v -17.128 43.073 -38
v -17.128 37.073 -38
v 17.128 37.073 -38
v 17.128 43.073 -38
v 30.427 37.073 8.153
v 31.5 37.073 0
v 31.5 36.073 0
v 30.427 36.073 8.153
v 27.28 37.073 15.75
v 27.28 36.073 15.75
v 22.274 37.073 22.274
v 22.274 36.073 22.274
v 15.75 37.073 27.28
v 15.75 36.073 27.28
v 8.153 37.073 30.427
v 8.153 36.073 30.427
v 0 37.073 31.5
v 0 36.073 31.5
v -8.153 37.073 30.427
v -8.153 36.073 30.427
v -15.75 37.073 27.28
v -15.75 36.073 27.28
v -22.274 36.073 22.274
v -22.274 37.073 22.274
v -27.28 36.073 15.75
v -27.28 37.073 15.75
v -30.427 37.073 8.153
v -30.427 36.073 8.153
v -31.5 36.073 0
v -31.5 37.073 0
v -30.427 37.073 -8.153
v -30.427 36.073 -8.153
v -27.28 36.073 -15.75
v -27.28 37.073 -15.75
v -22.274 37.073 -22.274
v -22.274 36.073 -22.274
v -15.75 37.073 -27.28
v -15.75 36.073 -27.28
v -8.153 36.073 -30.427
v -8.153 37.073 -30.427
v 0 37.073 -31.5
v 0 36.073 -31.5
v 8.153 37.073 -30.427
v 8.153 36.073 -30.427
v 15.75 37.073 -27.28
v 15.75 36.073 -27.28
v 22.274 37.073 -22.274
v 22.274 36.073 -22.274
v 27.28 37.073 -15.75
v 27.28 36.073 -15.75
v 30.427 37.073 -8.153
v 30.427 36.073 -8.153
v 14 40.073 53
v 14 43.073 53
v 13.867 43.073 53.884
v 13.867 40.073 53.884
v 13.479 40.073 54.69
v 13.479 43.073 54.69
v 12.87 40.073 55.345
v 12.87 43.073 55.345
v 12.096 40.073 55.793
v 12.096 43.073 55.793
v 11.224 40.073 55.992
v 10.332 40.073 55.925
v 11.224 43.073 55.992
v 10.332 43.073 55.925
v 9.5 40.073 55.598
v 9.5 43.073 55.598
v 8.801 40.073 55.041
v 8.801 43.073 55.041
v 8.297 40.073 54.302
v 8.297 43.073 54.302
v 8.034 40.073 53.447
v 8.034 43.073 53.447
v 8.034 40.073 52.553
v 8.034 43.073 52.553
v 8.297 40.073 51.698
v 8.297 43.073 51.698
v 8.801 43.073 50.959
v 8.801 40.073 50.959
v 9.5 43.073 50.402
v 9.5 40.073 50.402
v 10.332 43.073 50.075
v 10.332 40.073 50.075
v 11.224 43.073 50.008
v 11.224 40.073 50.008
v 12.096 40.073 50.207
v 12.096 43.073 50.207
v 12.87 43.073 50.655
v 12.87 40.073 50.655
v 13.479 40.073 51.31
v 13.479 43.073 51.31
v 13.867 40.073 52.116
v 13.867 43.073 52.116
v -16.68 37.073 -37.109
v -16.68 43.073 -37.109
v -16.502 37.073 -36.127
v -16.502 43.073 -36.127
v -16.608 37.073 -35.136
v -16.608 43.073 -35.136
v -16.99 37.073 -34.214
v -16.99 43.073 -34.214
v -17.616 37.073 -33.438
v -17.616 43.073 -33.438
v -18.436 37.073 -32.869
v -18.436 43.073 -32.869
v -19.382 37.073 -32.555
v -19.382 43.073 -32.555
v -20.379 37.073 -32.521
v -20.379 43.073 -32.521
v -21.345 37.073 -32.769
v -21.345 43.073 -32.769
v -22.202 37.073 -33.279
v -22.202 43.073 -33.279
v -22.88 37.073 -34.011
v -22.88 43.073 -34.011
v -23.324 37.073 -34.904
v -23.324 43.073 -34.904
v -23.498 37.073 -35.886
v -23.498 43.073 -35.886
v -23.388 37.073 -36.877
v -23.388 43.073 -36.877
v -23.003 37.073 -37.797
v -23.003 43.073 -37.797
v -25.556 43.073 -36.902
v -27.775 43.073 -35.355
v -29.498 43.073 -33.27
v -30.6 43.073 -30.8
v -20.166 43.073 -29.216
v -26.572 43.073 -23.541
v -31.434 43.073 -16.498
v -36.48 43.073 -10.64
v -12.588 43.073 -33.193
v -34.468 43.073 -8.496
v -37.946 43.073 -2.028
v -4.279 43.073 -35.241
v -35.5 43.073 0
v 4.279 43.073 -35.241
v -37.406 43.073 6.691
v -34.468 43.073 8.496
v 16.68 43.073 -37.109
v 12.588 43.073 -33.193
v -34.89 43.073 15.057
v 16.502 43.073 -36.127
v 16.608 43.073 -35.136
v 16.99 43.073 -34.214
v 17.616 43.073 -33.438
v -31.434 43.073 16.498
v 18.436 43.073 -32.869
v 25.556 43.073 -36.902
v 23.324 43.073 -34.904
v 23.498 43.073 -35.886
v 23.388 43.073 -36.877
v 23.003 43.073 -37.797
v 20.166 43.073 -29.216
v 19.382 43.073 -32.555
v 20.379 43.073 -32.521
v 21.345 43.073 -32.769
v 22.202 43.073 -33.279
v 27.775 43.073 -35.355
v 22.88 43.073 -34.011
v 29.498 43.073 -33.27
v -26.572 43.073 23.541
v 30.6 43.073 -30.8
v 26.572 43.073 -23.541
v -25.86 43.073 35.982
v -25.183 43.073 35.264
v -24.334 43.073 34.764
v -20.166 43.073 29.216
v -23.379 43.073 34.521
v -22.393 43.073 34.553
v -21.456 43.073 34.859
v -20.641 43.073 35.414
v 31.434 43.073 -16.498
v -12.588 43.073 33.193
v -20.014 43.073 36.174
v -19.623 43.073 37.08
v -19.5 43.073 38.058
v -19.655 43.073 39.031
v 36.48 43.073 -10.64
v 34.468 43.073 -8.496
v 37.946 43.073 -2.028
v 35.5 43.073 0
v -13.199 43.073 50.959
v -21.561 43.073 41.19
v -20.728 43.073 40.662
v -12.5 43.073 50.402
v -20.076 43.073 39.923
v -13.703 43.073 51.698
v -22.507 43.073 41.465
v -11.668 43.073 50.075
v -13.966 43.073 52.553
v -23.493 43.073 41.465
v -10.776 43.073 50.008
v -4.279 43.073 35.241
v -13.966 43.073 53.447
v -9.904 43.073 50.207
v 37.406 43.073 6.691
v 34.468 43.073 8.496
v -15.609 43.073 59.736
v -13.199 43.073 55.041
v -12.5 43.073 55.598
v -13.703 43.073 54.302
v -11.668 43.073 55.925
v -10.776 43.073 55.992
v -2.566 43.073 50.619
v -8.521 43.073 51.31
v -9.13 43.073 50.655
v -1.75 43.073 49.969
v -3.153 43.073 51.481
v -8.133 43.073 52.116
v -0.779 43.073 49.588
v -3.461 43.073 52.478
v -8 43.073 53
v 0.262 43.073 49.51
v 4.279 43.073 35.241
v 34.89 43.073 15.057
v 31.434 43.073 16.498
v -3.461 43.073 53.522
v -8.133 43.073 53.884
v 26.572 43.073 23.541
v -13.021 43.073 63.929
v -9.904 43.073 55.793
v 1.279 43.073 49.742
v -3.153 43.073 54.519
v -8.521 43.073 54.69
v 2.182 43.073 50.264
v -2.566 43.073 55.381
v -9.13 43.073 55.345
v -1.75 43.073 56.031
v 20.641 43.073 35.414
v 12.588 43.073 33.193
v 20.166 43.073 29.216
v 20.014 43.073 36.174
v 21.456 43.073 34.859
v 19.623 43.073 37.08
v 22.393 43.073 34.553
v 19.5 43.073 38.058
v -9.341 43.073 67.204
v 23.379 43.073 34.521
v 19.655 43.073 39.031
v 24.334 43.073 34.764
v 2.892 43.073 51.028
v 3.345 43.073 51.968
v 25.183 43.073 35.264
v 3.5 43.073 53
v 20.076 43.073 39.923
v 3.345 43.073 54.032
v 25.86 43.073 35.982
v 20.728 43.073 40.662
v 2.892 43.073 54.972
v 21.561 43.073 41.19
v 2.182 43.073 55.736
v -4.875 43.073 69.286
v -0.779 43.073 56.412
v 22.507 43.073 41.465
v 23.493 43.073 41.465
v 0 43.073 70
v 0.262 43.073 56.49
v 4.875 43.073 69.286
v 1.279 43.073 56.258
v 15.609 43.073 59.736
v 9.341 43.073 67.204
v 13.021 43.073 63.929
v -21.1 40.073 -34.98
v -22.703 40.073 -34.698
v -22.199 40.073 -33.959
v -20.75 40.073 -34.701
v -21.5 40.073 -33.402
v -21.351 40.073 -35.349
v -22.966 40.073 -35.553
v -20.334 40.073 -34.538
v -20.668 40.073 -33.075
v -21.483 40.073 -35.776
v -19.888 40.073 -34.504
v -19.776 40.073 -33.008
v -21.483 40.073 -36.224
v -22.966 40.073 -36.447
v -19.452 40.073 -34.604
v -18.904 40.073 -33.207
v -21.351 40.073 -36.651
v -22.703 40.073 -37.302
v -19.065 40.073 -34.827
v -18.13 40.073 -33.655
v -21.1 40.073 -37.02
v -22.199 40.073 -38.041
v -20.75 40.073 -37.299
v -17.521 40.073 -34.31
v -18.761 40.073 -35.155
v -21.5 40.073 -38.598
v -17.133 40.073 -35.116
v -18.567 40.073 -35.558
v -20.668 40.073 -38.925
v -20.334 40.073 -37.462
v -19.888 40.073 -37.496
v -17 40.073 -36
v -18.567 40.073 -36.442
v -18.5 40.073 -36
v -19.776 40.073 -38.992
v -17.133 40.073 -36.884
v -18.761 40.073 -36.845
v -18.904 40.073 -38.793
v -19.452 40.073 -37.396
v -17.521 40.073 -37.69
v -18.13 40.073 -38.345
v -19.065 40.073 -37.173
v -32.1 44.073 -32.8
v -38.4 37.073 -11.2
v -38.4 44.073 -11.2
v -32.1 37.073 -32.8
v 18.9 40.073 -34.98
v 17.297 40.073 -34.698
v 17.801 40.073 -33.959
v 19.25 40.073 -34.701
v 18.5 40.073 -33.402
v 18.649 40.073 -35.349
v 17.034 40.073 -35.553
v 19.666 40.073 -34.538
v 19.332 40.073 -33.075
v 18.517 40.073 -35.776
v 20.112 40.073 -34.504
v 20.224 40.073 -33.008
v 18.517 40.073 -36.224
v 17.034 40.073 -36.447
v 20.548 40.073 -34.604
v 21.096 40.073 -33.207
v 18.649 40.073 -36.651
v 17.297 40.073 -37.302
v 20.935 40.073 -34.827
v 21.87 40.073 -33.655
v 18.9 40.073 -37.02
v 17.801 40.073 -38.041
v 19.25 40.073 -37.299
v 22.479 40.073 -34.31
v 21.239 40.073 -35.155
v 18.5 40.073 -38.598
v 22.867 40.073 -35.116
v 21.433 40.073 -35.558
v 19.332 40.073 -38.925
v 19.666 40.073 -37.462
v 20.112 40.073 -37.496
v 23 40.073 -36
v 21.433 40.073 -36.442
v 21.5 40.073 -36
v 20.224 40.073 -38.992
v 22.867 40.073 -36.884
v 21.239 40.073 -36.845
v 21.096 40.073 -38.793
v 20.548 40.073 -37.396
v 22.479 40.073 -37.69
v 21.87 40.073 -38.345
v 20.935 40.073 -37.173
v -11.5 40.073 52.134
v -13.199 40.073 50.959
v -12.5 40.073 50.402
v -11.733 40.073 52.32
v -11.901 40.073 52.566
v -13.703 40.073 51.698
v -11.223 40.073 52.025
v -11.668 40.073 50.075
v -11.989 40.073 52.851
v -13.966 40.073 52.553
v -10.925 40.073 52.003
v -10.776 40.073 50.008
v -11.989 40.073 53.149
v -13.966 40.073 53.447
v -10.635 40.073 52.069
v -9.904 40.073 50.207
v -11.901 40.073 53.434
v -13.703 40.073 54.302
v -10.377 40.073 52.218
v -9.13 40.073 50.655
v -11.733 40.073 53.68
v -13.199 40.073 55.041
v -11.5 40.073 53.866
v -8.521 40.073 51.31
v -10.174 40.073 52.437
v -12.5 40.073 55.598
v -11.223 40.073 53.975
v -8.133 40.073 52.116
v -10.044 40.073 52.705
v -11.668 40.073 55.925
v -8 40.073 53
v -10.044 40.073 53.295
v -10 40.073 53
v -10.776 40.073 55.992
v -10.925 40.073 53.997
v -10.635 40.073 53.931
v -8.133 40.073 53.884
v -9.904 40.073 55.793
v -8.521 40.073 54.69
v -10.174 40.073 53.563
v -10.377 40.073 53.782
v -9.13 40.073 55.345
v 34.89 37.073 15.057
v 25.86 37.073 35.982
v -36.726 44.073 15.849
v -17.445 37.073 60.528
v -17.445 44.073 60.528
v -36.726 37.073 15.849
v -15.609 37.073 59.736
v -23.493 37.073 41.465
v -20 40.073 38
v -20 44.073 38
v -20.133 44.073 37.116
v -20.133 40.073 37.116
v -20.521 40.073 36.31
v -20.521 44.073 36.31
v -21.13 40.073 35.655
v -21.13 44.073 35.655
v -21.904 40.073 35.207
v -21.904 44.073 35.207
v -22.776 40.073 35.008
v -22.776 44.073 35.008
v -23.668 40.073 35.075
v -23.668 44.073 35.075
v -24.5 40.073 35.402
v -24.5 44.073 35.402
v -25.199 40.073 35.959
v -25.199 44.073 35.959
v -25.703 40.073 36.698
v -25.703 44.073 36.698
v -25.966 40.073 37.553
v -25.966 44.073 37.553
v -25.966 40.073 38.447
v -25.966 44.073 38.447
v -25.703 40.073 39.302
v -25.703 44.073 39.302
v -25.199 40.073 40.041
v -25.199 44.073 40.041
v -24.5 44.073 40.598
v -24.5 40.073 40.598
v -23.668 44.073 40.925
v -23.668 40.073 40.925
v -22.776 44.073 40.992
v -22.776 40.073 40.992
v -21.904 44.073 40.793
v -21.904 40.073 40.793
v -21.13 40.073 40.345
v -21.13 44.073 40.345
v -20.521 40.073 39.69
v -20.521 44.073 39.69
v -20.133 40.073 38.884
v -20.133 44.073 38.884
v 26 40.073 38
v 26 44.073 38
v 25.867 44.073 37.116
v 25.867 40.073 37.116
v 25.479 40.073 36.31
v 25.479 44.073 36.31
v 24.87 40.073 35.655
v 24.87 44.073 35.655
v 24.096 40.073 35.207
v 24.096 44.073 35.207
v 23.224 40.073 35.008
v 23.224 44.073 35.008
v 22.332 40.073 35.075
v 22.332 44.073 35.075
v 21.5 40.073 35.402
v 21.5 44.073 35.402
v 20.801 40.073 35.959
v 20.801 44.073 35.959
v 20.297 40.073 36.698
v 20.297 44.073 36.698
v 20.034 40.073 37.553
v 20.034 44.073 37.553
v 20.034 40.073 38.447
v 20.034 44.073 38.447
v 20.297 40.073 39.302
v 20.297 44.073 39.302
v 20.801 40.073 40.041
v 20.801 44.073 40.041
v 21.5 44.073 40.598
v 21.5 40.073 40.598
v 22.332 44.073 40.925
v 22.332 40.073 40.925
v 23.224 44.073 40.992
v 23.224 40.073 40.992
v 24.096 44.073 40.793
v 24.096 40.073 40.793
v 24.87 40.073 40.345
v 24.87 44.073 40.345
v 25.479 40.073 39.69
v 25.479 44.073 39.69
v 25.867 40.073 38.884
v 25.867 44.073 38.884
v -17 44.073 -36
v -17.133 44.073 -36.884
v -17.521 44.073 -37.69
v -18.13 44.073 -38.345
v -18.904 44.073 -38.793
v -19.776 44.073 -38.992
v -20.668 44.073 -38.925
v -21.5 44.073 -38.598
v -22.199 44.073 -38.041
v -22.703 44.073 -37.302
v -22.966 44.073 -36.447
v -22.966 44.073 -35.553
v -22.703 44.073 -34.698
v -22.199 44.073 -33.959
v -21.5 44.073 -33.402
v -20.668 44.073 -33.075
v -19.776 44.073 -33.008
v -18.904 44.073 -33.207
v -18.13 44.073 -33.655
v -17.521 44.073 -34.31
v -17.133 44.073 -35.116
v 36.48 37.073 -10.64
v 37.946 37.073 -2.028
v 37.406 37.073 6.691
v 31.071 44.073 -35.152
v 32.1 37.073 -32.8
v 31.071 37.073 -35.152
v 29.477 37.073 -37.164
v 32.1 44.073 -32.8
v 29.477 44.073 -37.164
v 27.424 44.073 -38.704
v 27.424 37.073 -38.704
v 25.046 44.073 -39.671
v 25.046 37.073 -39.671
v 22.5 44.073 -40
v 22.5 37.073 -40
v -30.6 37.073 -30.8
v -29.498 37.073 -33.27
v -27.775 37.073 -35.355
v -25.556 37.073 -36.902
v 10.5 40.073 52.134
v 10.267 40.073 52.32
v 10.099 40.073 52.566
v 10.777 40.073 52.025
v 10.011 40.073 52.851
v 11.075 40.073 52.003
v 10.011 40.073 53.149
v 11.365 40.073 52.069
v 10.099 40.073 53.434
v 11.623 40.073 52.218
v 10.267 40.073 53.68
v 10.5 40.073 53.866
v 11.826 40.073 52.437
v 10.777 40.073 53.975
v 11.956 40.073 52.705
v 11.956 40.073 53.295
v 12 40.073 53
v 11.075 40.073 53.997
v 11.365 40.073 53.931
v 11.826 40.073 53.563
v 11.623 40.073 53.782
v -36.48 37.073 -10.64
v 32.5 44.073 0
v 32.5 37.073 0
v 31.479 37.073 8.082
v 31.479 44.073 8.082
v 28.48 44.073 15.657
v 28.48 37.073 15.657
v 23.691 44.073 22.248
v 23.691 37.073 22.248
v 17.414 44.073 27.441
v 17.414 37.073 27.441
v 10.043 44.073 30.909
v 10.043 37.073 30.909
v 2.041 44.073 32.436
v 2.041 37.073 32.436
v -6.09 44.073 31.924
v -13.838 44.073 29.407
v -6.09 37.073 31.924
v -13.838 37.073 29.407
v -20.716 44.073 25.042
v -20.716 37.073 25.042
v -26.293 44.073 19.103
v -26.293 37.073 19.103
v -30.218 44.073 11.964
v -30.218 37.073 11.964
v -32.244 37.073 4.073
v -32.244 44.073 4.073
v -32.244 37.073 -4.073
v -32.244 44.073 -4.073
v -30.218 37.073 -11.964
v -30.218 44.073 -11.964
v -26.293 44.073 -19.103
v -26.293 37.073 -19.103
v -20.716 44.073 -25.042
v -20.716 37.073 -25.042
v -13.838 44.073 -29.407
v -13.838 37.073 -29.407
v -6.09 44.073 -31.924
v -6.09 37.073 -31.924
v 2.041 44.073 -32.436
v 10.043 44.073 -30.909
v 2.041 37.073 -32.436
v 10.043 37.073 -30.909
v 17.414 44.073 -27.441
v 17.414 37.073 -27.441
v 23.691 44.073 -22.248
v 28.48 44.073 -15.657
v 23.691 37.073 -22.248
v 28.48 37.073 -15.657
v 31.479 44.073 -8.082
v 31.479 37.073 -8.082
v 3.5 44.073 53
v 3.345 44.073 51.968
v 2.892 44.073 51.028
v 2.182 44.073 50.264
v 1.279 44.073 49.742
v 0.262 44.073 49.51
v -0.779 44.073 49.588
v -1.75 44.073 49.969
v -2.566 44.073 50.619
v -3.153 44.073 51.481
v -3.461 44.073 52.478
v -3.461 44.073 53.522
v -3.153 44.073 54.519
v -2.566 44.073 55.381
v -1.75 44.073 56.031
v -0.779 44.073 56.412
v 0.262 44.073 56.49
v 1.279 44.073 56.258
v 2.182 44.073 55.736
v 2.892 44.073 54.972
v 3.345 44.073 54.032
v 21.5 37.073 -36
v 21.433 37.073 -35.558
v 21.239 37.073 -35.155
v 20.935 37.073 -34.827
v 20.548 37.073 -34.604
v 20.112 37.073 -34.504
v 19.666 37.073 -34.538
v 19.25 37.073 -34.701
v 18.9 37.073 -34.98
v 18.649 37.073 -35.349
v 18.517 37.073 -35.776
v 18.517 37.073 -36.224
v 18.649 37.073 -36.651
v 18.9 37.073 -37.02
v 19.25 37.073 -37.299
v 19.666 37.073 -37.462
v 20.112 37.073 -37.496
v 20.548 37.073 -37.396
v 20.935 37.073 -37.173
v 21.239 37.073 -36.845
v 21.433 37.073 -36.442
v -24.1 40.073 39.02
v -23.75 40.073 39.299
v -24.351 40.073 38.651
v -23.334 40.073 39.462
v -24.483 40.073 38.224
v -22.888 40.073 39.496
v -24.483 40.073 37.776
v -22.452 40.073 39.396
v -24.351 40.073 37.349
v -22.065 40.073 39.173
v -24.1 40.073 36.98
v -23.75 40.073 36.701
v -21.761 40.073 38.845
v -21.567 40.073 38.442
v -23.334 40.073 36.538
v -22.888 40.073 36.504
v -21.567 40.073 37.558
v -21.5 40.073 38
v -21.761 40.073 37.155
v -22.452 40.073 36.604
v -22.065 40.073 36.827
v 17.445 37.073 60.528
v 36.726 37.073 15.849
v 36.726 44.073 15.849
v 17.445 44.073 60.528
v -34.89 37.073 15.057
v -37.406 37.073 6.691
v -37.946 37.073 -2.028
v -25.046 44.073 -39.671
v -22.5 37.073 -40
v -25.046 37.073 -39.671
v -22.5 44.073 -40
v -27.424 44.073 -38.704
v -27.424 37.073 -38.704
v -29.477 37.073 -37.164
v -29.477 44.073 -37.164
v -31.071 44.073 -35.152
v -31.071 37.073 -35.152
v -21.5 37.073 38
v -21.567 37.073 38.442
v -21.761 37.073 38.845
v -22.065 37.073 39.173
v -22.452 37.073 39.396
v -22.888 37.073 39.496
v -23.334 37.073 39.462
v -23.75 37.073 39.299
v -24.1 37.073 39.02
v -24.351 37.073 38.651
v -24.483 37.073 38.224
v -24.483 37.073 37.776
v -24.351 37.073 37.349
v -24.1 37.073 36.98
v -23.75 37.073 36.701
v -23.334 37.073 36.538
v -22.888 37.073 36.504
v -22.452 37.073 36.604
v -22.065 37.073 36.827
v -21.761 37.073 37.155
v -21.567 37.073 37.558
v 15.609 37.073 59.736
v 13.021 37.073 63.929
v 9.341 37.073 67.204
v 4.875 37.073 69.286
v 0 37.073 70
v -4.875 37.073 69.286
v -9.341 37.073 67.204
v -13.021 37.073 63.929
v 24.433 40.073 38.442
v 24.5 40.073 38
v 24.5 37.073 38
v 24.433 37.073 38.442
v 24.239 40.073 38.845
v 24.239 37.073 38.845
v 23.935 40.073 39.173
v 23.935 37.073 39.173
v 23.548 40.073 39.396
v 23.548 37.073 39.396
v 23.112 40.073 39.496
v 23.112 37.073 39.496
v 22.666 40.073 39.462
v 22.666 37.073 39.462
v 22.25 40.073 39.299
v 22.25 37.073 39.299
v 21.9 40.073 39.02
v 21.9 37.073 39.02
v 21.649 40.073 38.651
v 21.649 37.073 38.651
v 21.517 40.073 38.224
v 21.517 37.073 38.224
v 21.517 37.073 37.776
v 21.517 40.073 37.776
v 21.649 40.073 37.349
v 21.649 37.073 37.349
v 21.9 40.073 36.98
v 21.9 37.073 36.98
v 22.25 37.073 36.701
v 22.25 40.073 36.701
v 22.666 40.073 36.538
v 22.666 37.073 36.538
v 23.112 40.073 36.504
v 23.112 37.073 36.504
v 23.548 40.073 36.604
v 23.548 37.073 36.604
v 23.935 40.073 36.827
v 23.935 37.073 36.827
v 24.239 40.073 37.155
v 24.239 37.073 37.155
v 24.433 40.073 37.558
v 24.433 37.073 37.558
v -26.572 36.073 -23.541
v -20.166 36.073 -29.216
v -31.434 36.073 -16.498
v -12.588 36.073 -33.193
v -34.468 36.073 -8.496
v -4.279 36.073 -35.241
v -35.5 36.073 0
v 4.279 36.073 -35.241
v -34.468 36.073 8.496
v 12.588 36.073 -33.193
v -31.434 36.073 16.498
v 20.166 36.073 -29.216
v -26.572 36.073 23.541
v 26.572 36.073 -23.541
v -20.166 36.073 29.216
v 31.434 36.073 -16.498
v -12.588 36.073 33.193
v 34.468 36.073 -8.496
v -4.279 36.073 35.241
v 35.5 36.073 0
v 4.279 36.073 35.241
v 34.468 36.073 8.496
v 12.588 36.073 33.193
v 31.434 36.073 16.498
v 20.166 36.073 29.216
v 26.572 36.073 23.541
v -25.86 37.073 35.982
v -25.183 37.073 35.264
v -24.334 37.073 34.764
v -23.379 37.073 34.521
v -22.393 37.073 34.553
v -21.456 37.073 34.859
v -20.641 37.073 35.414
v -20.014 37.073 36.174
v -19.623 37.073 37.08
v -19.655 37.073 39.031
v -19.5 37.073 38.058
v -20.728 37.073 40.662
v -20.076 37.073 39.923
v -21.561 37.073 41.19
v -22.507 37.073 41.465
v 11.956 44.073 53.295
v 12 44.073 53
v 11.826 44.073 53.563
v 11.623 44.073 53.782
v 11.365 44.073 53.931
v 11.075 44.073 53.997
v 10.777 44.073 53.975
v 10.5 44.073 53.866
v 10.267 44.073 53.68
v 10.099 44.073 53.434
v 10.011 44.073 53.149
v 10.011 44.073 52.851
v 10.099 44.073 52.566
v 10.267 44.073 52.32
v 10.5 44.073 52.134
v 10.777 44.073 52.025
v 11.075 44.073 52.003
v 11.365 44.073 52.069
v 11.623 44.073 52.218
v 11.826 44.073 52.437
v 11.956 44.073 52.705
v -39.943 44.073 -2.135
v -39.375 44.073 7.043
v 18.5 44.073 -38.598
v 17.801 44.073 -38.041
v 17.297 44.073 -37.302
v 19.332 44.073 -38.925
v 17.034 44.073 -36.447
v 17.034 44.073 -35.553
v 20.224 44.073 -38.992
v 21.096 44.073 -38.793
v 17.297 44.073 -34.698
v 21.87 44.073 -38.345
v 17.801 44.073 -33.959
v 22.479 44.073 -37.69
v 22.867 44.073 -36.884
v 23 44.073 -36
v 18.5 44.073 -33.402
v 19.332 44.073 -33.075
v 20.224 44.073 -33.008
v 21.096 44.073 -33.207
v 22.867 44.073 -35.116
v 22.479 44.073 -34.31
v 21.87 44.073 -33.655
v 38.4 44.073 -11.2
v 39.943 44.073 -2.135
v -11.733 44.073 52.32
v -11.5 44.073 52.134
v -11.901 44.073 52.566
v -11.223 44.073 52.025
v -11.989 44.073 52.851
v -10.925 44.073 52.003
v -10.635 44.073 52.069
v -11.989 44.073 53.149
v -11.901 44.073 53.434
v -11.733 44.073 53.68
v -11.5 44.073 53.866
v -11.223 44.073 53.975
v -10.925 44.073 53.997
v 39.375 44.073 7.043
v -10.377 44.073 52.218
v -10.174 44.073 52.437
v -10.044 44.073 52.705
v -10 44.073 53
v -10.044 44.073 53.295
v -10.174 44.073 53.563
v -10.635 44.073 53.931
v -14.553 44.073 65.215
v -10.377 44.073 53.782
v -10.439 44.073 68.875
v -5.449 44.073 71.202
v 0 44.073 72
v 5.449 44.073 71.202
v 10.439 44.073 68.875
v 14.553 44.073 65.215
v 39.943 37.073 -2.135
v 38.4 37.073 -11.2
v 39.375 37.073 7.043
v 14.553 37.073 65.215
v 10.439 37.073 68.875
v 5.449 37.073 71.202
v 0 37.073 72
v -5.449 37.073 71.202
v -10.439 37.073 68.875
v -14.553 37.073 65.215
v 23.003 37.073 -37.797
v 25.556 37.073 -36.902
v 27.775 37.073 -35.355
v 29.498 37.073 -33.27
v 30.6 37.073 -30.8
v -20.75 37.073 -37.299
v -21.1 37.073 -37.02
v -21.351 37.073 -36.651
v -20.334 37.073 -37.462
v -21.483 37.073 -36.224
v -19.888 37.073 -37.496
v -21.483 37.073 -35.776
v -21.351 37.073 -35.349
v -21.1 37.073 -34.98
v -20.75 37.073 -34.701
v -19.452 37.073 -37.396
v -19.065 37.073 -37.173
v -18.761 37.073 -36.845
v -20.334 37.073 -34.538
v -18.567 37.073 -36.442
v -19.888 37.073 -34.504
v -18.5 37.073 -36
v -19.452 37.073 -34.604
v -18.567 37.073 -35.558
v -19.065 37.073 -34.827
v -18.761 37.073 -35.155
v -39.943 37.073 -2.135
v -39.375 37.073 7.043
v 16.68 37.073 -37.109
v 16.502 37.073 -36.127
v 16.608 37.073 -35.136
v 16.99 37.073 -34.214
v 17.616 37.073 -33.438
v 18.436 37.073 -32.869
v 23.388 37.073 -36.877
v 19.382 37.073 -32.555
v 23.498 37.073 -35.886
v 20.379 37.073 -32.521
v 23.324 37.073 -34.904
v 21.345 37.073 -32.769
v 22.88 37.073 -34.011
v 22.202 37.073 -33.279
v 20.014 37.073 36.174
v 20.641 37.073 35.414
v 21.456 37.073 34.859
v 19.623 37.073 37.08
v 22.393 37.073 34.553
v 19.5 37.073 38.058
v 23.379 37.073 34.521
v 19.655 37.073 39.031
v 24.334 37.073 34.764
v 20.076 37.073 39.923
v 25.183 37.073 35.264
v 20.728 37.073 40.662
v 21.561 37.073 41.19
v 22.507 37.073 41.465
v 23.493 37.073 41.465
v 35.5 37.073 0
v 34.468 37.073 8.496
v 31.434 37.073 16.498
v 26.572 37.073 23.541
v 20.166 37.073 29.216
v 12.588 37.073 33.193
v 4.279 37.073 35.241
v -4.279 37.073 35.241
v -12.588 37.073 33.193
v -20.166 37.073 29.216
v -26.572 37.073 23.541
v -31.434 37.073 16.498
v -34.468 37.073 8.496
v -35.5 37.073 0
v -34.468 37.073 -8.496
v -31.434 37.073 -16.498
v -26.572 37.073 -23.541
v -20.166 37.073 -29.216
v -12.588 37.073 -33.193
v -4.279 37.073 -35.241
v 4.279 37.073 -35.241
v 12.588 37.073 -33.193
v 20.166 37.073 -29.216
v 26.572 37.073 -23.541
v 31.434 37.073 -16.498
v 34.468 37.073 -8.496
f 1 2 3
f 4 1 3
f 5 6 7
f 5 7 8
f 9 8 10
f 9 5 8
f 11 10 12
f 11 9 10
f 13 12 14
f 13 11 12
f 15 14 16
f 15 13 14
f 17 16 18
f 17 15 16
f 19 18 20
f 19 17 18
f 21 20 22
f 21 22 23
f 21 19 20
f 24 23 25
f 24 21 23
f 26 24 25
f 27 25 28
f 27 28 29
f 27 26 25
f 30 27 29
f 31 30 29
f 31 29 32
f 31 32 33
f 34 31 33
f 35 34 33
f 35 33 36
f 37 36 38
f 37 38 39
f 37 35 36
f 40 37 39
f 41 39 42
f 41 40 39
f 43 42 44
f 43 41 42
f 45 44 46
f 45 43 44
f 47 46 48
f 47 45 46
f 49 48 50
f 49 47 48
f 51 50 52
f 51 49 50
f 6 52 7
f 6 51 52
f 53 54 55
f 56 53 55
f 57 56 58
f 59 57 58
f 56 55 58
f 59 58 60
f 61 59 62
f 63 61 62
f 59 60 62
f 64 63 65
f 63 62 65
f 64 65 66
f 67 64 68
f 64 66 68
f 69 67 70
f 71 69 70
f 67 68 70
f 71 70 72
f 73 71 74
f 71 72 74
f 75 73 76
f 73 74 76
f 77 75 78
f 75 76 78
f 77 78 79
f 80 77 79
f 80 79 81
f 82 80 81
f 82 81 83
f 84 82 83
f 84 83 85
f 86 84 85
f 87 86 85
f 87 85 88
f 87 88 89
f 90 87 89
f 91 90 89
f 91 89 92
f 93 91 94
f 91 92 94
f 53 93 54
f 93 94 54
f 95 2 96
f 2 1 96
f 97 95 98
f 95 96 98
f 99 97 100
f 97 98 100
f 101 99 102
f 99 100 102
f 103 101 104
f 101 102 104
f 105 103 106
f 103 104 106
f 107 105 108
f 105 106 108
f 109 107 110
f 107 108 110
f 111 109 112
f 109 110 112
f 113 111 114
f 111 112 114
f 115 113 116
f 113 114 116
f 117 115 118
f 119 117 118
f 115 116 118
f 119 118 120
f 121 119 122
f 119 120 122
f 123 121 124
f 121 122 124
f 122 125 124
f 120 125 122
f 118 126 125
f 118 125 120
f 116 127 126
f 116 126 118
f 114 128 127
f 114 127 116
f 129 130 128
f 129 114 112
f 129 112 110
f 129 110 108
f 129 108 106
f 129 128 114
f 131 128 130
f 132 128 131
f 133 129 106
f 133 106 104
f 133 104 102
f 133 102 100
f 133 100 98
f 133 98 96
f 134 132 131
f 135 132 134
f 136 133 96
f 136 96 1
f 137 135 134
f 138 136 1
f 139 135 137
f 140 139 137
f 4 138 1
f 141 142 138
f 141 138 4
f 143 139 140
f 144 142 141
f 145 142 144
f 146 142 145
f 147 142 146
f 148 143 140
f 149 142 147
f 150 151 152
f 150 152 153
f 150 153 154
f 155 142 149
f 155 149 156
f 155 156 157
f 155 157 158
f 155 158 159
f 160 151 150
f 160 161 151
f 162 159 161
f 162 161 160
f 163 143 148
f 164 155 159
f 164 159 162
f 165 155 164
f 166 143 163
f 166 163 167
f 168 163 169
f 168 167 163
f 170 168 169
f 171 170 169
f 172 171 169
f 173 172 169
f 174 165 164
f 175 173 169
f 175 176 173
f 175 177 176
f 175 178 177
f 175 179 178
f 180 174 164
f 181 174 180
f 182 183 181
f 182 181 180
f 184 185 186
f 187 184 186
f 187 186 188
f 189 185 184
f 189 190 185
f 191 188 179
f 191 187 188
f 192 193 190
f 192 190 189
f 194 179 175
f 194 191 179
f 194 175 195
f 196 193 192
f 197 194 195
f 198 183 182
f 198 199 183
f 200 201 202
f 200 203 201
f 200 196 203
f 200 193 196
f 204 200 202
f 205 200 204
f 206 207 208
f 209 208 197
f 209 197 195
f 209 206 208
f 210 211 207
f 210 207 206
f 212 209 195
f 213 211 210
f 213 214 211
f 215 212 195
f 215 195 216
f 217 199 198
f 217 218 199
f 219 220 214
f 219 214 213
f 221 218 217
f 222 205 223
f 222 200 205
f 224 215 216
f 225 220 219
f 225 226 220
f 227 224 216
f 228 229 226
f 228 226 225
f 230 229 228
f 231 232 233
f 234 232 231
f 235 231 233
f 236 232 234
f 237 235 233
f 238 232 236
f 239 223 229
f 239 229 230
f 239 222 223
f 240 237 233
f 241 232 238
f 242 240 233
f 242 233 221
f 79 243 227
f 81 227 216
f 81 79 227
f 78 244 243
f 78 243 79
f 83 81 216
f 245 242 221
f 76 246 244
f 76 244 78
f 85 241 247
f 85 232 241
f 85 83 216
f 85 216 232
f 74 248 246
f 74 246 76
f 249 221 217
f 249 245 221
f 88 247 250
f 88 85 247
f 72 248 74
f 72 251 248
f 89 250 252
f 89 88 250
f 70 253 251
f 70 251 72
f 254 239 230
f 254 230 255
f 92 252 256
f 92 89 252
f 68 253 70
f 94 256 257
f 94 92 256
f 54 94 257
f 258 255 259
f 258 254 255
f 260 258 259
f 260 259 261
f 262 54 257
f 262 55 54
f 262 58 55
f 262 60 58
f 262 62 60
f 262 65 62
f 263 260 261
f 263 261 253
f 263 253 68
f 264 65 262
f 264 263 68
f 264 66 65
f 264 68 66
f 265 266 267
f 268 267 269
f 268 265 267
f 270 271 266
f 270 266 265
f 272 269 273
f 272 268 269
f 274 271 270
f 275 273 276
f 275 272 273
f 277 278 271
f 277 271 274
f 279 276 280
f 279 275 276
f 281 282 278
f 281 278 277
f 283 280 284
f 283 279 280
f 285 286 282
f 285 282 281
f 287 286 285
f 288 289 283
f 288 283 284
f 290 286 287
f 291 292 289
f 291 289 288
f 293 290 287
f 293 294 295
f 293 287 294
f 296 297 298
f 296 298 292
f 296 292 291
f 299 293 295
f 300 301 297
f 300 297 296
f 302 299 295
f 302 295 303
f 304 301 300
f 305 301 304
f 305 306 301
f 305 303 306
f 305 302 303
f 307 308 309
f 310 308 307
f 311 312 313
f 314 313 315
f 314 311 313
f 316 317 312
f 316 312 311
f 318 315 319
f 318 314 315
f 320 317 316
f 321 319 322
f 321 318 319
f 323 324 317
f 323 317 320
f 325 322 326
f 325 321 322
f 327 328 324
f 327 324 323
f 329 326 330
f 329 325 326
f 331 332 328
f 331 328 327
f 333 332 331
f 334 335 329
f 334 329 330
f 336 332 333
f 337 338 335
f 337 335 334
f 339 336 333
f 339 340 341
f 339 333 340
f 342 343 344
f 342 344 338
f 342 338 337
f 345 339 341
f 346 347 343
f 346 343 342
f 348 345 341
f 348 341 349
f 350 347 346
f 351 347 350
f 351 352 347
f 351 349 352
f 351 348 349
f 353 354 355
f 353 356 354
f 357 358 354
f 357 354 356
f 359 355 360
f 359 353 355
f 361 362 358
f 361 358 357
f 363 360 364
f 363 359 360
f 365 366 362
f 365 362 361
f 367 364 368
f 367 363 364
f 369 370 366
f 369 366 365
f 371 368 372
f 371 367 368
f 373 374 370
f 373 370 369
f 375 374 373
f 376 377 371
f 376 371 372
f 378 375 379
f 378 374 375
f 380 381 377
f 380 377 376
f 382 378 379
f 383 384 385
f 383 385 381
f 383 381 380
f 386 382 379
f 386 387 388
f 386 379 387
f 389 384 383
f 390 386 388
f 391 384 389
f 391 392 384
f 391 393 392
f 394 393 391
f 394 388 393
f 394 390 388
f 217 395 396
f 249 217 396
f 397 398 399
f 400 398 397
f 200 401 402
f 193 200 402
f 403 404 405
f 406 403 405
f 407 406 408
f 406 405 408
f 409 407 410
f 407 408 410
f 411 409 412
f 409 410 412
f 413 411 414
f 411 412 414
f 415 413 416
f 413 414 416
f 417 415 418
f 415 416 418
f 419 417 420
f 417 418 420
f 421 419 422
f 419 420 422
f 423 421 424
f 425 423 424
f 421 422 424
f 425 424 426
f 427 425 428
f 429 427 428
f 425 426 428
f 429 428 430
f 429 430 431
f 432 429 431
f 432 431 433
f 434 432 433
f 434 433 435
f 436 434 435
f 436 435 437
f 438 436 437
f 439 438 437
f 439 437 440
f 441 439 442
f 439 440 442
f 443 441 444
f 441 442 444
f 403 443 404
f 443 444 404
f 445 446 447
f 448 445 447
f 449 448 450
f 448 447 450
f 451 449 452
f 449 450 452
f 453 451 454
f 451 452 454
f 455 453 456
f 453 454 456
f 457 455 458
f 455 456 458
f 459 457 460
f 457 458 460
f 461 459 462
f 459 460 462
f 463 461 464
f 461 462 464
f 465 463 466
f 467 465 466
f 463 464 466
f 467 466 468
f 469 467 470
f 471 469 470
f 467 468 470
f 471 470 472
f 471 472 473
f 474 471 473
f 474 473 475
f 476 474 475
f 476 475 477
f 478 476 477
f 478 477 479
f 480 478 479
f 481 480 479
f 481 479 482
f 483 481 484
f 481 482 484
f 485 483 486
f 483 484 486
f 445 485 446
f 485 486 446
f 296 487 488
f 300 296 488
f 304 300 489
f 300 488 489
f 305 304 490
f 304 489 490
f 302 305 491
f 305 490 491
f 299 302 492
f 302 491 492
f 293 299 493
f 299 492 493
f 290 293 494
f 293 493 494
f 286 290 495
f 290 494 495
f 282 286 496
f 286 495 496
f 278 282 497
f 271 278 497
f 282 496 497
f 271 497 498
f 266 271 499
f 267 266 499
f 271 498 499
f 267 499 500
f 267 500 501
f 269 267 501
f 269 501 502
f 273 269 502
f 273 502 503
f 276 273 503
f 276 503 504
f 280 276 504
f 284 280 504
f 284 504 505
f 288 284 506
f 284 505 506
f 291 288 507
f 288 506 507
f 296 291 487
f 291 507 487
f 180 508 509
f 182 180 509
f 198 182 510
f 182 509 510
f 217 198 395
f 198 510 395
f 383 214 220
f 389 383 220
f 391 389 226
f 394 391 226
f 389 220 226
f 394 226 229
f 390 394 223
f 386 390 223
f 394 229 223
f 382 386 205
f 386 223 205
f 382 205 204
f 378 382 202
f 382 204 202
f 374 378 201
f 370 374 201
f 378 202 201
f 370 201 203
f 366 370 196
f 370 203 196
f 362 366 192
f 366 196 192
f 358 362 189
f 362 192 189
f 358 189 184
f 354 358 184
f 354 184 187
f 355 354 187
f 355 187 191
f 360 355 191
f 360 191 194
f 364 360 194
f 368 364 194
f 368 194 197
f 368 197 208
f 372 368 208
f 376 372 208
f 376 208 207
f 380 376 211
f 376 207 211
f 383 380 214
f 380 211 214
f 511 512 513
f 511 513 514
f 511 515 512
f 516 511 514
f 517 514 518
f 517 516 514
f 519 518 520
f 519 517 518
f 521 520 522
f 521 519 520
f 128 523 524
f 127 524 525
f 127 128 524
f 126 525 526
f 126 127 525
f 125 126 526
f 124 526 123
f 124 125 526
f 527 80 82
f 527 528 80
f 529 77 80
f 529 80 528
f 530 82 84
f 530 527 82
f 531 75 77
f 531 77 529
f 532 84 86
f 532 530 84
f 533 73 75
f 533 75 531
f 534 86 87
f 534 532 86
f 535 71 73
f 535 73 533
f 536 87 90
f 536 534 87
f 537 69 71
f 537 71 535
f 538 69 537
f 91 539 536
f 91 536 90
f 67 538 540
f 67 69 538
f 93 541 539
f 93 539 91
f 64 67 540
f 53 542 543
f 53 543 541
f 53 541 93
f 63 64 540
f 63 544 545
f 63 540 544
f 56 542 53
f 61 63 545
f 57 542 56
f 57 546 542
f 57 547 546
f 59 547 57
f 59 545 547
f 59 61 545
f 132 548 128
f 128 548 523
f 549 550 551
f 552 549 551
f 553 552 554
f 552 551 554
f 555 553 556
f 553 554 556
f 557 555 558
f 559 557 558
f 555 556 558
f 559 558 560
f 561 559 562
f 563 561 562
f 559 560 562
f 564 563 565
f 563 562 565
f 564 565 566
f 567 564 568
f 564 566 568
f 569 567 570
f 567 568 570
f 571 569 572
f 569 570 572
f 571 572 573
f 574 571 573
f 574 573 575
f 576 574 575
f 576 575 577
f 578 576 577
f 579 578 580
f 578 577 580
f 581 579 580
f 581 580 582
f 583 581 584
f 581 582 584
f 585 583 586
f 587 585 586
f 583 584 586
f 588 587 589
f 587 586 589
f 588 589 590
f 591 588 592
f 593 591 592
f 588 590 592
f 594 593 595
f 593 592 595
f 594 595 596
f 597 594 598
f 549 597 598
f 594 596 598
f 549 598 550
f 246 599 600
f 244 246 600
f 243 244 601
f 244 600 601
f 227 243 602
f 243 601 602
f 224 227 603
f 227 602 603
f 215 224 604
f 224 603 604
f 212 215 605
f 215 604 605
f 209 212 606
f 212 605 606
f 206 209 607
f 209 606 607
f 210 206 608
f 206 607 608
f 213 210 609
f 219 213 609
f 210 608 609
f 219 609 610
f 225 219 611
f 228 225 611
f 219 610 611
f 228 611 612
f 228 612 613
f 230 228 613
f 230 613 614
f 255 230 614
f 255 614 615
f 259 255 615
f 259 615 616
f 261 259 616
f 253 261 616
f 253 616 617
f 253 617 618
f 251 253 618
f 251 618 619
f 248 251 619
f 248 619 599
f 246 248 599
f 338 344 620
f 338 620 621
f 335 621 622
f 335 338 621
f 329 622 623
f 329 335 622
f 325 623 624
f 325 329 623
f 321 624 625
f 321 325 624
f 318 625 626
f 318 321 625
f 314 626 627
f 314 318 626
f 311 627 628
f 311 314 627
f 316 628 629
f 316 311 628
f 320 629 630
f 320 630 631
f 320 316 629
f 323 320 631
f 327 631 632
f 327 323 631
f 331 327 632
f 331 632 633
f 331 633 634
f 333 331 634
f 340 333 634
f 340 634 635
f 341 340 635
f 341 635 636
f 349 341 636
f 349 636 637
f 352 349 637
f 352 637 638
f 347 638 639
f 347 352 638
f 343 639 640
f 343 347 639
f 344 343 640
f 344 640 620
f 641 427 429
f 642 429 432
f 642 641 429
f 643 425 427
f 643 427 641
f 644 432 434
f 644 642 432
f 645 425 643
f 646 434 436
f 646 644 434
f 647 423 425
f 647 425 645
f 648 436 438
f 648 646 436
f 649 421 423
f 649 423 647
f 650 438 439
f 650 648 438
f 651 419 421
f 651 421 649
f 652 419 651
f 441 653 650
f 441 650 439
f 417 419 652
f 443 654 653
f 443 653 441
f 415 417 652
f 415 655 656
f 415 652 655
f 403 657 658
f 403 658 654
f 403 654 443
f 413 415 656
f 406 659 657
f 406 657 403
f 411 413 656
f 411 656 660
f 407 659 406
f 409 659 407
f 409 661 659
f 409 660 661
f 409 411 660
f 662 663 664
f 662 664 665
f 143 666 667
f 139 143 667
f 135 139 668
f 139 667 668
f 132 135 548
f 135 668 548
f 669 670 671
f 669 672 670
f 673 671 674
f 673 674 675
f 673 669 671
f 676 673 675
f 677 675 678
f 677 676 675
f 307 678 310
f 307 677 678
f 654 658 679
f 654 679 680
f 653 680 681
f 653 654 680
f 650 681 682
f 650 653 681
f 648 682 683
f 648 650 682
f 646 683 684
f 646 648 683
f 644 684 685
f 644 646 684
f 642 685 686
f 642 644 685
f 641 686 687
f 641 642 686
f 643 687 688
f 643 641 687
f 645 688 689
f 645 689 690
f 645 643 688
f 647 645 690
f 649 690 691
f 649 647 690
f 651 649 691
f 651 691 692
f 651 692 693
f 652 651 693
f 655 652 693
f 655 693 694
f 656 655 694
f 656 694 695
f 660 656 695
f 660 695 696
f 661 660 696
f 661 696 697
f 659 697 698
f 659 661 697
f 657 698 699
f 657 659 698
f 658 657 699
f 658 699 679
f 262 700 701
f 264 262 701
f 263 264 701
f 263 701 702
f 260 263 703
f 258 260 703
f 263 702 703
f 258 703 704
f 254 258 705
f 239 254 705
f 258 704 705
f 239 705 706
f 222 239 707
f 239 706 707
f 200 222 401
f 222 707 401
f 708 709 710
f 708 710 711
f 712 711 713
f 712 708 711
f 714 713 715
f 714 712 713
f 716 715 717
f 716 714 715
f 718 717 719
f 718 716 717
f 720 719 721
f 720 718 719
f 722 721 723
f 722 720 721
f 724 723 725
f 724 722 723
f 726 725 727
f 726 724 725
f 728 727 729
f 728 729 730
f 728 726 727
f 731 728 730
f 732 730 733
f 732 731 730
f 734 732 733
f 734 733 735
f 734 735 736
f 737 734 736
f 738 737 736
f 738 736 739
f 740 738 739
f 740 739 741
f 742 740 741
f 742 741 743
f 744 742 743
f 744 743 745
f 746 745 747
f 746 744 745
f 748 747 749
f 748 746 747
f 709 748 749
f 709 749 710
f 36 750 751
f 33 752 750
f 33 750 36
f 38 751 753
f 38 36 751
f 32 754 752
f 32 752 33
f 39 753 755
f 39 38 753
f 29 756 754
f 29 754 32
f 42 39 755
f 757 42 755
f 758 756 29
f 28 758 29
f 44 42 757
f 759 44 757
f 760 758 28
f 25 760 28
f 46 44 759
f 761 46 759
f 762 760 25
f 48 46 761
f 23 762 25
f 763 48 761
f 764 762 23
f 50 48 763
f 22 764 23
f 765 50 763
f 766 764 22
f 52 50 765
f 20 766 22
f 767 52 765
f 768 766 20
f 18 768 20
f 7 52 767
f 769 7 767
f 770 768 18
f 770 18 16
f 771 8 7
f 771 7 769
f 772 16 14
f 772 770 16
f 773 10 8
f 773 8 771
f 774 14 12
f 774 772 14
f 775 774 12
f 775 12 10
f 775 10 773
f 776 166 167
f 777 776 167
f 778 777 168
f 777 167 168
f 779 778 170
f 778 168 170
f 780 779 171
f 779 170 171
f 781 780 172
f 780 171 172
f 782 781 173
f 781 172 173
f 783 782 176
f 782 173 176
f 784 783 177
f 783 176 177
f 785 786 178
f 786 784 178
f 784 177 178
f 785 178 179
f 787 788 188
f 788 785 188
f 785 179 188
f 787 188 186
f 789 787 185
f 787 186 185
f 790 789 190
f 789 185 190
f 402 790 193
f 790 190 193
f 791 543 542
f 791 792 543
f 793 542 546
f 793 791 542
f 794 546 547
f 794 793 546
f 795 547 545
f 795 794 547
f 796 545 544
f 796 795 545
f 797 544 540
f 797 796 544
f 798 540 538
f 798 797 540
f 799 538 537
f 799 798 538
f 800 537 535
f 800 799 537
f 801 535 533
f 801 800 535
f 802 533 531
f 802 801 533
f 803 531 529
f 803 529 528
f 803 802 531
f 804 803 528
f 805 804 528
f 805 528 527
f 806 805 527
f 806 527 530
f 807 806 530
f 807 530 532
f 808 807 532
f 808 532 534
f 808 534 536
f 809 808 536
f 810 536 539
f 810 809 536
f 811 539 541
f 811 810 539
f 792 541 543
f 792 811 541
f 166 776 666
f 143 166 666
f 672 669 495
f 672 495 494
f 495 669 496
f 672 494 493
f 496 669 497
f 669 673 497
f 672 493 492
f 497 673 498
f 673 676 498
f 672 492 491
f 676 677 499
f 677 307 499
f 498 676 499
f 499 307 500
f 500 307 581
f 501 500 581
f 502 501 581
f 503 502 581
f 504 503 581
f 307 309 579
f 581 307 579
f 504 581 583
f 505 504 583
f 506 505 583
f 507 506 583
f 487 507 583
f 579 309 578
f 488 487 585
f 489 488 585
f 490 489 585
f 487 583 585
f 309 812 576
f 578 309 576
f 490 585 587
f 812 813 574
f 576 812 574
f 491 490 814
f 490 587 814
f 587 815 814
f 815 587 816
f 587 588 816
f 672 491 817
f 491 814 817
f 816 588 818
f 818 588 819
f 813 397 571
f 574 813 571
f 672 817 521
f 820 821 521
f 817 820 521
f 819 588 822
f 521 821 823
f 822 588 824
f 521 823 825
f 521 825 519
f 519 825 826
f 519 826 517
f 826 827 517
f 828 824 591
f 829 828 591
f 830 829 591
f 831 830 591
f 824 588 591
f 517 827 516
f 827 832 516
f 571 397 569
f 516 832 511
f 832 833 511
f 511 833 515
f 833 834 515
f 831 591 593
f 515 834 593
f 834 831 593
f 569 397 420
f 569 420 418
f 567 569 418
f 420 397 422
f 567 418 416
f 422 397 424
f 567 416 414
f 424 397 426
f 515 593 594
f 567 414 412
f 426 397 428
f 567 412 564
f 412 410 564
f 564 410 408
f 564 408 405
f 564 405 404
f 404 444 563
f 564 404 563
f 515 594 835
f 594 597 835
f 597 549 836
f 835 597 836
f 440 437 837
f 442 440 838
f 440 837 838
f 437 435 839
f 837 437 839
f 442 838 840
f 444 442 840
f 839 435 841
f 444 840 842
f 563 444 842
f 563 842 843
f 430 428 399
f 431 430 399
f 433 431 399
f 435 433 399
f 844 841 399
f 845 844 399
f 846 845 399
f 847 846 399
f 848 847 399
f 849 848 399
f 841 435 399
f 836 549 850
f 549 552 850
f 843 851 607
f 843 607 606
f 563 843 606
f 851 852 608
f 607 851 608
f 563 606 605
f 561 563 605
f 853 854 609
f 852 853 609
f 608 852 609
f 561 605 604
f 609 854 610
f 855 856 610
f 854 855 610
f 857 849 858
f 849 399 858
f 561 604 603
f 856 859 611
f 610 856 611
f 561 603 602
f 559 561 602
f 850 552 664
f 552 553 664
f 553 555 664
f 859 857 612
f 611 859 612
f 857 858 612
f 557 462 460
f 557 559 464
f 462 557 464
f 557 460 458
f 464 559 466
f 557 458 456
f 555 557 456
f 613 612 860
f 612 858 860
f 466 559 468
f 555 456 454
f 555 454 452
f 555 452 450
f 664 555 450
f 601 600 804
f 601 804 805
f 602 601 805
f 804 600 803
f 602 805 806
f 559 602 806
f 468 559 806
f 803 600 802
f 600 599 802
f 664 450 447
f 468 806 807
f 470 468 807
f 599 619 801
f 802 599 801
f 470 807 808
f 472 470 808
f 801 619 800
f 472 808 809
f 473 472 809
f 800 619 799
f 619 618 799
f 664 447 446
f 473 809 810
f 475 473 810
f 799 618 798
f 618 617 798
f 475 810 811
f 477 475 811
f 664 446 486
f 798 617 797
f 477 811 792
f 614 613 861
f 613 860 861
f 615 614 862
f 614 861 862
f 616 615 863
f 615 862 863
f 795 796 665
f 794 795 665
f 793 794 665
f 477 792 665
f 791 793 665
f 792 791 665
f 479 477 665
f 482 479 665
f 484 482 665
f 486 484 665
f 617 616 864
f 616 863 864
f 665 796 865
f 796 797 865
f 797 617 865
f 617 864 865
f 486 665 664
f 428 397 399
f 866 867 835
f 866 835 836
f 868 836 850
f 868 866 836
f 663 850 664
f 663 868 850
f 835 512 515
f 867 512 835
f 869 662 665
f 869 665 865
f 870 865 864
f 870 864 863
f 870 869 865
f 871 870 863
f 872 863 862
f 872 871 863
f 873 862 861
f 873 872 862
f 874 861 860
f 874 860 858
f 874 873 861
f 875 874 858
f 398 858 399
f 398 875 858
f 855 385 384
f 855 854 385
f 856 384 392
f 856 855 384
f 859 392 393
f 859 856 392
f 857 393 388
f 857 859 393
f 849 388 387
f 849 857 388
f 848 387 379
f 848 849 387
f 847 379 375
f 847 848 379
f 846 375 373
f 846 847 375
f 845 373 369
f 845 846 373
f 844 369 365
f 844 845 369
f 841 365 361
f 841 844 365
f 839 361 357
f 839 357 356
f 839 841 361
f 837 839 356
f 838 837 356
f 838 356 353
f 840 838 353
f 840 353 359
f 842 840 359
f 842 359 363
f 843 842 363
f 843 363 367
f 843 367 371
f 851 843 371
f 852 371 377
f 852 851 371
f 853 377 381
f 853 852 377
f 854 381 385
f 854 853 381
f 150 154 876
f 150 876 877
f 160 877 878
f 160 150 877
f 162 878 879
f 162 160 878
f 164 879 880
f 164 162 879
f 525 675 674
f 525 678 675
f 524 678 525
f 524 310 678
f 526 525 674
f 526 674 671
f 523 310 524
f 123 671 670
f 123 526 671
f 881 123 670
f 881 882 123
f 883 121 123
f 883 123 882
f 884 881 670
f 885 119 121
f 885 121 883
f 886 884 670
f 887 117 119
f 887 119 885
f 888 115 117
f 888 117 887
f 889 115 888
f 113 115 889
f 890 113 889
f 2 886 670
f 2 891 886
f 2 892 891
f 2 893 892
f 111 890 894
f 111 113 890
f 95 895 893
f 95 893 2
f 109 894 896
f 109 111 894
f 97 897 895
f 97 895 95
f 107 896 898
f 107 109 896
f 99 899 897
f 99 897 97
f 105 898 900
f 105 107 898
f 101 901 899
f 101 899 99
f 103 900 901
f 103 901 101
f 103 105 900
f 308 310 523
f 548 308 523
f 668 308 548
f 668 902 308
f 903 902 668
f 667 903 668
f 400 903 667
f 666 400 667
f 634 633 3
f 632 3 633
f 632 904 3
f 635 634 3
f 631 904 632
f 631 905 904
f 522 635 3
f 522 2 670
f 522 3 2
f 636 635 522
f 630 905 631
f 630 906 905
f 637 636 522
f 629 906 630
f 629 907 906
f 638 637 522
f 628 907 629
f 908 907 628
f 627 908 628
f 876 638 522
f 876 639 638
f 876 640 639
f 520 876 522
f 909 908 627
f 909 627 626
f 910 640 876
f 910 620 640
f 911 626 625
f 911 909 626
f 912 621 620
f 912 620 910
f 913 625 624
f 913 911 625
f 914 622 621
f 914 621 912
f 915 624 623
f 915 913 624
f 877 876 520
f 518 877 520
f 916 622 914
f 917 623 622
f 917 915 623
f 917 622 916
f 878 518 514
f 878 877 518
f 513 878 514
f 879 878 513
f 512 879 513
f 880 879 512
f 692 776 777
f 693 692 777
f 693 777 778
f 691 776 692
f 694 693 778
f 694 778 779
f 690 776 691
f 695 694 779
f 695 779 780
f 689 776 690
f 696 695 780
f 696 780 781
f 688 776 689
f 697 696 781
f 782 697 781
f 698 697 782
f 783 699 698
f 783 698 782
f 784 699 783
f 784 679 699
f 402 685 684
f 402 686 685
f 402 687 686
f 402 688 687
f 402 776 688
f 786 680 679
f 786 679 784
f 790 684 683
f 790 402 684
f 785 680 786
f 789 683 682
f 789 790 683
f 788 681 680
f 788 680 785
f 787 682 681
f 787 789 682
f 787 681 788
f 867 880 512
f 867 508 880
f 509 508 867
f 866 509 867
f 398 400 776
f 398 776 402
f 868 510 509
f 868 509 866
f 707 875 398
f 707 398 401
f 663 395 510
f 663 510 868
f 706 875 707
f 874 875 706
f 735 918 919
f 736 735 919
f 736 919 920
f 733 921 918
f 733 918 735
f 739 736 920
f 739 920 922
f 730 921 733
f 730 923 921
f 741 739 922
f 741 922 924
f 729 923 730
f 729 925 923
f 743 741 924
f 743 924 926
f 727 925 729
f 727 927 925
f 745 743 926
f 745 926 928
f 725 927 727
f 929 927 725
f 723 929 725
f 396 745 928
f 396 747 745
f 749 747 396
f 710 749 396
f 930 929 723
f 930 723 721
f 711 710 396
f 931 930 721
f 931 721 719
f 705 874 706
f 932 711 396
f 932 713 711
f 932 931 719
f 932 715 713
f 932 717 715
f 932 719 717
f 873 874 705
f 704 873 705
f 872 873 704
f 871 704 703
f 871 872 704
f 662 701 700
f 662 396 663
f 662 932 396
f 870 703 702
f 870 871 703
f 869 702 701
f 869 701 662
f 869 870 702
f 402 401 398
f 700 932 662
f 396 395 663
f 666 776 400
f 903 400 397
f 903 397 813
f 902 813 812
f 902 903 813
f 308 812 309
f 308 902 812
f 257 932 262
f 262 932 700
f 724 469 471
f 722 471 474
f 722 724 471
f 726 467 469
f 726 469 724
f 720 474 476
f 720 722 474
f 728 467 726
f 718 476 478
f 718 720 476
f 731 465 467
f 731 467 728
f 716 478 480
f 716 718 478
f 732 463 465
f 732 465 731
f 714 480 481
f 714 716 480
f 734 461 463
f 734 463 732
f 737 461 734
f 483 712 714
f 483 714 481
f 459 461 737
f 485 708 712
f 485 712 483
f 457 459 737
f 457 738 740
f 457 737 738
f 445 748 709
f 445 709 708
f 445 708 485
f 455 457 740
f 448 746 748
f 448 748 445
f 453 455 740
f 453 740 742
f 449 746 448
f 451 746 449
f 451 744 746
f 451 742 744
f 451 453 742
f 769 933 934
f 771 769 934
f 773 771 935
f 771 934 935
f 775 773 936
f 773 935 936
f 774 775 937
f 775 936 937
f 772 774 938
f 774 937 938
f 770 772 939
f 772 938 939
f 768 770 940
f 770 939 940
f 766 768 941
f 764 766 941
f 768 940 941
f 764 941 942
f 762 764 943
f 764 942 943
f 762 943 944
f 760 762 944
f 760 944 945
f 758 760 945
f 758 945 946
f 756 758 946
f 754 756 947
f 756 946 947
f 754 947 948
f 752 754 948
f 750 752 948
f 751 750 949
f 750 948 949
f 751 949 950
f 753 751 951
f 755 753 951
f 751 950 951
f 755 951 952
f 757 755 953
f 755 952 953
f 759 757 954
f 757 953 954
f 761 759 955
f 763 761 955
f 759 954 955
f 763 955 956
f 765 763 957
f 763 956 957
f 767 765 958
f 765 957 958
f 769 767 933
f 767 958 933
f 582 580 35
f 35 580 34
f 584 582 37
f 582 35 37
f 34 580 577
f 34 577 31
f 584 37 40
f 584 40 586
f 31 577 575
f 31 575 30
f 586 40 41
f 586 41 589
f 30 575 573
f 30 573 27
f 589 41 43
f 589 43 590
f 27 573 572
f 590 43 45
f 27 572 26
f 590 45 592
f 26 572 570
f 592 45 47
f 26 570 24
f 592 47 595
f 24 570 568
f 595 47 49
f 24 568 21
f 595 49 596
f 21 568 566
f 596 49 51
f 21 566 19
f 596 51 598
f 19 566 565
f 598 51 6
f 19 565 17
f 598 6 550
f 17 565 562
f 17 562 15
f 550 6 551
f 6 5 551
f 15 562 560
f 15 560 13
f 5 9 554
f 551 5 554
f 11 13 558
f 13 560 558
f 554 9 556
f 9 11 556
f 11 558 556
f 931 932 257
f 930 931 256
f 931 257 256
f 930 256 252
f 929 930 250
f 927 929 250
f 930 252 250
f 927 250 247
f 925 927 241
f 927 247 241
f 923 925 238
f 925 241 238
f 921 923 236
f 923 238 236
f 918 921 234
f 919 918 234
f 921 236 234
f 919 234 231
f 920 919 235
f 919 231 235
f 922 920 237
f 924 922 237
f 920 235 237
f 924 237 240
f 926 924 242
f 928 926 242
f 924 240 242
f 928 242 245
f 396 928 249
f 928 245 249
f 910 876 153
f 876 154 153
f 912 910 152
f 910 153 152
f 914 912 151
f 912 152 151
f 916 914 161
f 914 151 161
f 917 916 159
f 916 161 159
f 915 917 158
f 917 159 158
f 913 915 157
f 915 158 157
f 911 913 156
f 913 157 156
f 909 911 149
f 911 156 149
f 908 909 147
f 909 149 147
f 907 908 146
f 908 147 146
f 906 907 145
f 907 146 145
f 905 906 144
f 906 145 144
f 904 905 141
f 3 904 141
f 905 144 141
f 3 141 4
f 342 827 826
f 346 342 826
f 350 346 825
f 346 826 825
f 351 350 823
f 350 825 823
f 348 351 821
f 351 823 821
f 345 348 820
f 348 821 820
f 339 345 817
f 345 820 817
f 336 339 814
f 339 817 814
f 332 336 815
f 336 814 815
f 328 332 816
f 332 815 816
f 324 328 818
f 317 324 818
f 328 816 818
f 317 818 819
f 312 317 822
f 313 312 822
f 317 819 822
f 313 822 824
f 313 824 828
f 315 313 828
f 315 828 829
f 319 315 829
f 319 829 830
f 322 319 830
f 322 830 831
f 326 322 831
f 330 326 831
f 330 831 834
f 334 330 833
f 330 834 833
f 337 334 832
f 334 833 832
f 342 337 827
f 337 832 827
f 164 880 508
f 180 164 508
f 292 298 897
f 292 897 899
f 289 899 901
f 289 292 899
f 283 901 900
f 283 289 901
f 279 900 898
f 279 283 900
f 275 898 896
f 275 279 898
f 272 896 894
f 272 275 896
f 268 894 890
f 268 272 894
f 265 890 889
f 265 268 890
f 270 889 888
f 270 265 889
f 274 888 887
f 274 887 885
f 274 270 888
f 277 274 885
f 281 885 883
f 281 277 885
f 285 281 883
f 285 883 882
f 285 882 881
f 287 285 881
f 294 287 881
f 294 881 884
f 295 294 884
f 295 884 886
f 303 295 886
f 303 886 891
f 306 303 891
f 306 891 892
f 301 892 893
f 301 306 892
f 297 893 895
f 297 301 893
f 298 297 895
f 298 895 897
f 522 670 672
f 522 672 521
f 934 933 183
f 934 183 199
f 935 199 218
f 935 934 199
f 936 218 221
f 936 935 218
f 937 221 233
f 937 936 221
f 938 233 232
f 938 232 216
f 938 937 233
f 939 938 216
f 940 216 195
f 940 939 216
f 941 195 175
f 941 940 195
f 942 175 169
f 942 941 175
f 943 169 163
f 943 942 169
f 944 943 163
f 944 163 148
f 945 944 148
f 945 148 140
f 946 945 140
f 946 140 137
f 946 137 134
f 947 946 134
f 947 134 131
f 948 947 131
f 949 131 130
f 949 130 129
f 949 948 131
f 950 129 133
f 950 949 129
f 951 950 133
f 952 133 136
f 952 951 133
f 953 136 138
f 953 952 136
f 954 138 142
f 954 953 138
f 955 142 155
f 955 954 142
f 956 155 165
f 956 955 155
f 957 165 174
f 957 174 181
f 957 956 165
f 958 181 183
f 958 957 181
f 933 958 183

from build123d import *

# Parameters (mm, degrees)
SKETCH1_R           = 32.5
BOSS_EXTRUDE1_DEPTH = 7
SKETCH2_R           = 3.5
SKETCH2_R_2         = 1
CUT_EXTRUDE1_DEPTH  = 10
SKETCH3_R           = 35.5
CUT_EXTRUDE2_DEPTH  = 6
FILLET1_R           = 10
SKETCH4_R           = 1.5
CUT_EXTRUDE3_DEPTH  = 10
SKETCH5_R           = 3.5
SKETCH5_R_2         = 1.5
BOSS_EXTRUDE2_DEPTH = 6
SKETCH6_R           = 3
CUT_EXTRUDE4_DEPTH  = 4
SKETCH8_R           = 3
SKETCH8_R_2         = 1
BOSS_EXTRUDE3_DEPTH = 3
SKETCH9_R           = 35.5
SKETCH9_R_2         = 31.5
BOSS_EXTRUDE4_DEPTH = 1


with BuildPart() as part:
    # Sketch1 → Boss-Extrude1 (new body)
    with BuildSketch(Plane.XZ.offset(-37.073034342)):
        with BuildLine():
            ThreePointArc((38.4, -11.2), (39.923628268, 2.470608411), (36.72611339, 15.849056604))
            Line((36.72611339, 15.849056604), (17.44490386, 60.528301887))
            ThreePointArc((17.44490386, 60.528301887), (0, 72), (-17.44490386, 60.528301887))
            Line((-17.44490386, 60.528301887), (-36.72611339, 15.849056604))
            ThreePointArc((-36.72611339, 15.849056604), (-39.923628268, 2.470608411), (-38.4, -11.2))
            Line((-38.4, -11.2), (-30, -40))
            Line((-30, -40), (30, -40))
            Line((30, -40), (38.4, -11.2))
        make_face()
        Circle(SKETCH1_R, mode=Mode.SUBTRACT)
    extrude(amount=-BOSS_EXTRUDE1_DEPTH)

    # Sketch2 → Cut-Extrude1 (cut)
    with BuildSketch(Plane(origin=(0, 44.073034342, 0), x_dir=(1, 0, 0), z_dir=(0, 1, 0))):
        with Locations((0, -53)):
            Circle(SKETCH2_R)
        with Locations((11, -53)):
            Circle(SKETCH2_R_2)
        with Locations((-11, -53)):
            Circle(SKETCH2_R_2)
    extrude(amount=-CUT_EXTRUDE1_DEPTH, mode=Mode.SUBTRACT)

    # Sketch3 → Cut-Extrude2 (cut)
    with BuildSketch(Plane.XZ.offset(-37.073034342)):
        with BuildLine():
            Line((34.889807721, 15.056603774), (15.608598191, 59.735849057))
            ThreePointArc((15.608598191, 59.735849057), (0, 70), (-15.608598191, 59.735849057))
            Line((-15.608598191, 59.735849057), (-34.889807721, 15.056603774))
            ThreePointArc((-34.889807721, 15.056603774), (-37.927446855, 2.347077991), (-36.48, -10.64))
            Line((-36.48, -10.64), (-28.5, -38))
            Line((-28.5, -38), (28.5, -38))
            Line((28.5, -38), (36.48, -10.64))
            ThreePointArc((36.48, -10.64), (37.927446855, 2.347077991), (34.889807721, 15.056603774))
        make_face()
        Circle(SKETCH3_R, mode=Mode.SUBTRACT)
    extrude(amount=-CUT_EXTRUDE2_DEPTH, mode=Mode.SUBTRACT)

    # Fillet1
    fillet1_edges = [part.edges().sort_by_distance(p)[0] for p in [
        (30, 40.573034342, -40),
        (-30, 40.573034342, -40),
        (28.5, 40.073034342, -38),
        (-28.5, 40.073034342, -38),
    ]]
    fillet(fillet1_edges, radius=FILLET1_R)

    # Sketch4 → Cut-Extrude3 (cut)
    with BuildSketch(Plane(origin=(0, 44.073034342, 0), x_dir=(1, 0, 0), z_dir=(0, 1, 0))):
        with Locations((-20, 36)):
            Circle(SKETCH4_R)
        with Locations((20, 36)):
            Circle(SKETCH4_R)
        with Locations((23, -38)):
            Circle(SKETCH4_R)
        with Locations((-23, -38)):
            Circle(SKETCH4_R)
    extrude(amount=-CUT_EXTRUDE3_DEPTH, mode=Mode.SUBTRACT)

    # Sketch5 → Boss-Extrude2 (add)
    with BuildSketch(Plane.XZ.offset(-43.073034342)):
        with Locations((-23, 38)):
            Circle(SKETCH5_R)
        with Locations((-23, 38)):
            Circle(SKETCH5_R_2, mode=Mode.SUBTRACT)
        with Locations((23, 38)):
            Circle(SKETCH5_R)
        with Locations((23, 38)):
            Circle(SKETCH5_R_2, mode=Mode.SUBTRACT)
        with Locations((-20, -36)):
            Circle(SKETCH5_R)
        with Locations((-20, -36)):
            Circle(SKETCH5_R_2, mode=Mode.SUBTRACT)
        with Locations((20, -36)):
            Circle(SKETCH5_R)
        with Locations((20, -36)):
            Circle(SKETCH5_R_2, mode=Mode.SUBTRACT)
    extrude(amount=BOSS_EXTRUDE2_DEPTH)

    # Sketch6 → Cut-Extrude4 (cut)
    with BuildSketch(Plane(origin=(0, 44.073034342, 0), x_dir=(1, 0, 0), z_dir=(0, 1, 0))):
        with Locations((-20, 36)):
            Circle(SKETCH6_R)
        with Locations((20, 36)):
            Circle(SKETCH6_R)
        with Locations((-23, -38)):
            Circle(SKETCH6_R)
        with Locations((23, -38)):
            Circle(SKETCH6_R)
    extrude(amount=-CUT_EXTRUDE4_DEPTH, mode=Mode.SUBTRACT)

    # Sketch8 → Boss-Extrude3 (add)
    with BuildSketch(Plane.XZ.offset(-43.073034342)):
        with Locations((11, 53)):
            Circle(SKETCH8_R)
        with Locations((11, 53)):
            Circle(SKETCH8_R_2, mode=Mode.SUBTRACT)
        with Locations((-11, 53)):
            Circle(SKETCH8_R)
        with Locations((-11, 53)):
            Circle(SKETCH8_R_2, mode=Mode.SUBTRACT)
    extrude(amount=BOSS_EXTRUDE3_DEPTH)

    # Sketch9 → Boss-Extrude4 (add)
    with BuildSketch(Plane.XZ.offset(-37.073034342)):
        Circle(SKETCH9_R)
        Circle(SKETCH9_R_2, mode=Mode.SUBTRACT)
    extrude(amount=BOSS_EXTRUDE4_DEPTH)


solid = part.part
